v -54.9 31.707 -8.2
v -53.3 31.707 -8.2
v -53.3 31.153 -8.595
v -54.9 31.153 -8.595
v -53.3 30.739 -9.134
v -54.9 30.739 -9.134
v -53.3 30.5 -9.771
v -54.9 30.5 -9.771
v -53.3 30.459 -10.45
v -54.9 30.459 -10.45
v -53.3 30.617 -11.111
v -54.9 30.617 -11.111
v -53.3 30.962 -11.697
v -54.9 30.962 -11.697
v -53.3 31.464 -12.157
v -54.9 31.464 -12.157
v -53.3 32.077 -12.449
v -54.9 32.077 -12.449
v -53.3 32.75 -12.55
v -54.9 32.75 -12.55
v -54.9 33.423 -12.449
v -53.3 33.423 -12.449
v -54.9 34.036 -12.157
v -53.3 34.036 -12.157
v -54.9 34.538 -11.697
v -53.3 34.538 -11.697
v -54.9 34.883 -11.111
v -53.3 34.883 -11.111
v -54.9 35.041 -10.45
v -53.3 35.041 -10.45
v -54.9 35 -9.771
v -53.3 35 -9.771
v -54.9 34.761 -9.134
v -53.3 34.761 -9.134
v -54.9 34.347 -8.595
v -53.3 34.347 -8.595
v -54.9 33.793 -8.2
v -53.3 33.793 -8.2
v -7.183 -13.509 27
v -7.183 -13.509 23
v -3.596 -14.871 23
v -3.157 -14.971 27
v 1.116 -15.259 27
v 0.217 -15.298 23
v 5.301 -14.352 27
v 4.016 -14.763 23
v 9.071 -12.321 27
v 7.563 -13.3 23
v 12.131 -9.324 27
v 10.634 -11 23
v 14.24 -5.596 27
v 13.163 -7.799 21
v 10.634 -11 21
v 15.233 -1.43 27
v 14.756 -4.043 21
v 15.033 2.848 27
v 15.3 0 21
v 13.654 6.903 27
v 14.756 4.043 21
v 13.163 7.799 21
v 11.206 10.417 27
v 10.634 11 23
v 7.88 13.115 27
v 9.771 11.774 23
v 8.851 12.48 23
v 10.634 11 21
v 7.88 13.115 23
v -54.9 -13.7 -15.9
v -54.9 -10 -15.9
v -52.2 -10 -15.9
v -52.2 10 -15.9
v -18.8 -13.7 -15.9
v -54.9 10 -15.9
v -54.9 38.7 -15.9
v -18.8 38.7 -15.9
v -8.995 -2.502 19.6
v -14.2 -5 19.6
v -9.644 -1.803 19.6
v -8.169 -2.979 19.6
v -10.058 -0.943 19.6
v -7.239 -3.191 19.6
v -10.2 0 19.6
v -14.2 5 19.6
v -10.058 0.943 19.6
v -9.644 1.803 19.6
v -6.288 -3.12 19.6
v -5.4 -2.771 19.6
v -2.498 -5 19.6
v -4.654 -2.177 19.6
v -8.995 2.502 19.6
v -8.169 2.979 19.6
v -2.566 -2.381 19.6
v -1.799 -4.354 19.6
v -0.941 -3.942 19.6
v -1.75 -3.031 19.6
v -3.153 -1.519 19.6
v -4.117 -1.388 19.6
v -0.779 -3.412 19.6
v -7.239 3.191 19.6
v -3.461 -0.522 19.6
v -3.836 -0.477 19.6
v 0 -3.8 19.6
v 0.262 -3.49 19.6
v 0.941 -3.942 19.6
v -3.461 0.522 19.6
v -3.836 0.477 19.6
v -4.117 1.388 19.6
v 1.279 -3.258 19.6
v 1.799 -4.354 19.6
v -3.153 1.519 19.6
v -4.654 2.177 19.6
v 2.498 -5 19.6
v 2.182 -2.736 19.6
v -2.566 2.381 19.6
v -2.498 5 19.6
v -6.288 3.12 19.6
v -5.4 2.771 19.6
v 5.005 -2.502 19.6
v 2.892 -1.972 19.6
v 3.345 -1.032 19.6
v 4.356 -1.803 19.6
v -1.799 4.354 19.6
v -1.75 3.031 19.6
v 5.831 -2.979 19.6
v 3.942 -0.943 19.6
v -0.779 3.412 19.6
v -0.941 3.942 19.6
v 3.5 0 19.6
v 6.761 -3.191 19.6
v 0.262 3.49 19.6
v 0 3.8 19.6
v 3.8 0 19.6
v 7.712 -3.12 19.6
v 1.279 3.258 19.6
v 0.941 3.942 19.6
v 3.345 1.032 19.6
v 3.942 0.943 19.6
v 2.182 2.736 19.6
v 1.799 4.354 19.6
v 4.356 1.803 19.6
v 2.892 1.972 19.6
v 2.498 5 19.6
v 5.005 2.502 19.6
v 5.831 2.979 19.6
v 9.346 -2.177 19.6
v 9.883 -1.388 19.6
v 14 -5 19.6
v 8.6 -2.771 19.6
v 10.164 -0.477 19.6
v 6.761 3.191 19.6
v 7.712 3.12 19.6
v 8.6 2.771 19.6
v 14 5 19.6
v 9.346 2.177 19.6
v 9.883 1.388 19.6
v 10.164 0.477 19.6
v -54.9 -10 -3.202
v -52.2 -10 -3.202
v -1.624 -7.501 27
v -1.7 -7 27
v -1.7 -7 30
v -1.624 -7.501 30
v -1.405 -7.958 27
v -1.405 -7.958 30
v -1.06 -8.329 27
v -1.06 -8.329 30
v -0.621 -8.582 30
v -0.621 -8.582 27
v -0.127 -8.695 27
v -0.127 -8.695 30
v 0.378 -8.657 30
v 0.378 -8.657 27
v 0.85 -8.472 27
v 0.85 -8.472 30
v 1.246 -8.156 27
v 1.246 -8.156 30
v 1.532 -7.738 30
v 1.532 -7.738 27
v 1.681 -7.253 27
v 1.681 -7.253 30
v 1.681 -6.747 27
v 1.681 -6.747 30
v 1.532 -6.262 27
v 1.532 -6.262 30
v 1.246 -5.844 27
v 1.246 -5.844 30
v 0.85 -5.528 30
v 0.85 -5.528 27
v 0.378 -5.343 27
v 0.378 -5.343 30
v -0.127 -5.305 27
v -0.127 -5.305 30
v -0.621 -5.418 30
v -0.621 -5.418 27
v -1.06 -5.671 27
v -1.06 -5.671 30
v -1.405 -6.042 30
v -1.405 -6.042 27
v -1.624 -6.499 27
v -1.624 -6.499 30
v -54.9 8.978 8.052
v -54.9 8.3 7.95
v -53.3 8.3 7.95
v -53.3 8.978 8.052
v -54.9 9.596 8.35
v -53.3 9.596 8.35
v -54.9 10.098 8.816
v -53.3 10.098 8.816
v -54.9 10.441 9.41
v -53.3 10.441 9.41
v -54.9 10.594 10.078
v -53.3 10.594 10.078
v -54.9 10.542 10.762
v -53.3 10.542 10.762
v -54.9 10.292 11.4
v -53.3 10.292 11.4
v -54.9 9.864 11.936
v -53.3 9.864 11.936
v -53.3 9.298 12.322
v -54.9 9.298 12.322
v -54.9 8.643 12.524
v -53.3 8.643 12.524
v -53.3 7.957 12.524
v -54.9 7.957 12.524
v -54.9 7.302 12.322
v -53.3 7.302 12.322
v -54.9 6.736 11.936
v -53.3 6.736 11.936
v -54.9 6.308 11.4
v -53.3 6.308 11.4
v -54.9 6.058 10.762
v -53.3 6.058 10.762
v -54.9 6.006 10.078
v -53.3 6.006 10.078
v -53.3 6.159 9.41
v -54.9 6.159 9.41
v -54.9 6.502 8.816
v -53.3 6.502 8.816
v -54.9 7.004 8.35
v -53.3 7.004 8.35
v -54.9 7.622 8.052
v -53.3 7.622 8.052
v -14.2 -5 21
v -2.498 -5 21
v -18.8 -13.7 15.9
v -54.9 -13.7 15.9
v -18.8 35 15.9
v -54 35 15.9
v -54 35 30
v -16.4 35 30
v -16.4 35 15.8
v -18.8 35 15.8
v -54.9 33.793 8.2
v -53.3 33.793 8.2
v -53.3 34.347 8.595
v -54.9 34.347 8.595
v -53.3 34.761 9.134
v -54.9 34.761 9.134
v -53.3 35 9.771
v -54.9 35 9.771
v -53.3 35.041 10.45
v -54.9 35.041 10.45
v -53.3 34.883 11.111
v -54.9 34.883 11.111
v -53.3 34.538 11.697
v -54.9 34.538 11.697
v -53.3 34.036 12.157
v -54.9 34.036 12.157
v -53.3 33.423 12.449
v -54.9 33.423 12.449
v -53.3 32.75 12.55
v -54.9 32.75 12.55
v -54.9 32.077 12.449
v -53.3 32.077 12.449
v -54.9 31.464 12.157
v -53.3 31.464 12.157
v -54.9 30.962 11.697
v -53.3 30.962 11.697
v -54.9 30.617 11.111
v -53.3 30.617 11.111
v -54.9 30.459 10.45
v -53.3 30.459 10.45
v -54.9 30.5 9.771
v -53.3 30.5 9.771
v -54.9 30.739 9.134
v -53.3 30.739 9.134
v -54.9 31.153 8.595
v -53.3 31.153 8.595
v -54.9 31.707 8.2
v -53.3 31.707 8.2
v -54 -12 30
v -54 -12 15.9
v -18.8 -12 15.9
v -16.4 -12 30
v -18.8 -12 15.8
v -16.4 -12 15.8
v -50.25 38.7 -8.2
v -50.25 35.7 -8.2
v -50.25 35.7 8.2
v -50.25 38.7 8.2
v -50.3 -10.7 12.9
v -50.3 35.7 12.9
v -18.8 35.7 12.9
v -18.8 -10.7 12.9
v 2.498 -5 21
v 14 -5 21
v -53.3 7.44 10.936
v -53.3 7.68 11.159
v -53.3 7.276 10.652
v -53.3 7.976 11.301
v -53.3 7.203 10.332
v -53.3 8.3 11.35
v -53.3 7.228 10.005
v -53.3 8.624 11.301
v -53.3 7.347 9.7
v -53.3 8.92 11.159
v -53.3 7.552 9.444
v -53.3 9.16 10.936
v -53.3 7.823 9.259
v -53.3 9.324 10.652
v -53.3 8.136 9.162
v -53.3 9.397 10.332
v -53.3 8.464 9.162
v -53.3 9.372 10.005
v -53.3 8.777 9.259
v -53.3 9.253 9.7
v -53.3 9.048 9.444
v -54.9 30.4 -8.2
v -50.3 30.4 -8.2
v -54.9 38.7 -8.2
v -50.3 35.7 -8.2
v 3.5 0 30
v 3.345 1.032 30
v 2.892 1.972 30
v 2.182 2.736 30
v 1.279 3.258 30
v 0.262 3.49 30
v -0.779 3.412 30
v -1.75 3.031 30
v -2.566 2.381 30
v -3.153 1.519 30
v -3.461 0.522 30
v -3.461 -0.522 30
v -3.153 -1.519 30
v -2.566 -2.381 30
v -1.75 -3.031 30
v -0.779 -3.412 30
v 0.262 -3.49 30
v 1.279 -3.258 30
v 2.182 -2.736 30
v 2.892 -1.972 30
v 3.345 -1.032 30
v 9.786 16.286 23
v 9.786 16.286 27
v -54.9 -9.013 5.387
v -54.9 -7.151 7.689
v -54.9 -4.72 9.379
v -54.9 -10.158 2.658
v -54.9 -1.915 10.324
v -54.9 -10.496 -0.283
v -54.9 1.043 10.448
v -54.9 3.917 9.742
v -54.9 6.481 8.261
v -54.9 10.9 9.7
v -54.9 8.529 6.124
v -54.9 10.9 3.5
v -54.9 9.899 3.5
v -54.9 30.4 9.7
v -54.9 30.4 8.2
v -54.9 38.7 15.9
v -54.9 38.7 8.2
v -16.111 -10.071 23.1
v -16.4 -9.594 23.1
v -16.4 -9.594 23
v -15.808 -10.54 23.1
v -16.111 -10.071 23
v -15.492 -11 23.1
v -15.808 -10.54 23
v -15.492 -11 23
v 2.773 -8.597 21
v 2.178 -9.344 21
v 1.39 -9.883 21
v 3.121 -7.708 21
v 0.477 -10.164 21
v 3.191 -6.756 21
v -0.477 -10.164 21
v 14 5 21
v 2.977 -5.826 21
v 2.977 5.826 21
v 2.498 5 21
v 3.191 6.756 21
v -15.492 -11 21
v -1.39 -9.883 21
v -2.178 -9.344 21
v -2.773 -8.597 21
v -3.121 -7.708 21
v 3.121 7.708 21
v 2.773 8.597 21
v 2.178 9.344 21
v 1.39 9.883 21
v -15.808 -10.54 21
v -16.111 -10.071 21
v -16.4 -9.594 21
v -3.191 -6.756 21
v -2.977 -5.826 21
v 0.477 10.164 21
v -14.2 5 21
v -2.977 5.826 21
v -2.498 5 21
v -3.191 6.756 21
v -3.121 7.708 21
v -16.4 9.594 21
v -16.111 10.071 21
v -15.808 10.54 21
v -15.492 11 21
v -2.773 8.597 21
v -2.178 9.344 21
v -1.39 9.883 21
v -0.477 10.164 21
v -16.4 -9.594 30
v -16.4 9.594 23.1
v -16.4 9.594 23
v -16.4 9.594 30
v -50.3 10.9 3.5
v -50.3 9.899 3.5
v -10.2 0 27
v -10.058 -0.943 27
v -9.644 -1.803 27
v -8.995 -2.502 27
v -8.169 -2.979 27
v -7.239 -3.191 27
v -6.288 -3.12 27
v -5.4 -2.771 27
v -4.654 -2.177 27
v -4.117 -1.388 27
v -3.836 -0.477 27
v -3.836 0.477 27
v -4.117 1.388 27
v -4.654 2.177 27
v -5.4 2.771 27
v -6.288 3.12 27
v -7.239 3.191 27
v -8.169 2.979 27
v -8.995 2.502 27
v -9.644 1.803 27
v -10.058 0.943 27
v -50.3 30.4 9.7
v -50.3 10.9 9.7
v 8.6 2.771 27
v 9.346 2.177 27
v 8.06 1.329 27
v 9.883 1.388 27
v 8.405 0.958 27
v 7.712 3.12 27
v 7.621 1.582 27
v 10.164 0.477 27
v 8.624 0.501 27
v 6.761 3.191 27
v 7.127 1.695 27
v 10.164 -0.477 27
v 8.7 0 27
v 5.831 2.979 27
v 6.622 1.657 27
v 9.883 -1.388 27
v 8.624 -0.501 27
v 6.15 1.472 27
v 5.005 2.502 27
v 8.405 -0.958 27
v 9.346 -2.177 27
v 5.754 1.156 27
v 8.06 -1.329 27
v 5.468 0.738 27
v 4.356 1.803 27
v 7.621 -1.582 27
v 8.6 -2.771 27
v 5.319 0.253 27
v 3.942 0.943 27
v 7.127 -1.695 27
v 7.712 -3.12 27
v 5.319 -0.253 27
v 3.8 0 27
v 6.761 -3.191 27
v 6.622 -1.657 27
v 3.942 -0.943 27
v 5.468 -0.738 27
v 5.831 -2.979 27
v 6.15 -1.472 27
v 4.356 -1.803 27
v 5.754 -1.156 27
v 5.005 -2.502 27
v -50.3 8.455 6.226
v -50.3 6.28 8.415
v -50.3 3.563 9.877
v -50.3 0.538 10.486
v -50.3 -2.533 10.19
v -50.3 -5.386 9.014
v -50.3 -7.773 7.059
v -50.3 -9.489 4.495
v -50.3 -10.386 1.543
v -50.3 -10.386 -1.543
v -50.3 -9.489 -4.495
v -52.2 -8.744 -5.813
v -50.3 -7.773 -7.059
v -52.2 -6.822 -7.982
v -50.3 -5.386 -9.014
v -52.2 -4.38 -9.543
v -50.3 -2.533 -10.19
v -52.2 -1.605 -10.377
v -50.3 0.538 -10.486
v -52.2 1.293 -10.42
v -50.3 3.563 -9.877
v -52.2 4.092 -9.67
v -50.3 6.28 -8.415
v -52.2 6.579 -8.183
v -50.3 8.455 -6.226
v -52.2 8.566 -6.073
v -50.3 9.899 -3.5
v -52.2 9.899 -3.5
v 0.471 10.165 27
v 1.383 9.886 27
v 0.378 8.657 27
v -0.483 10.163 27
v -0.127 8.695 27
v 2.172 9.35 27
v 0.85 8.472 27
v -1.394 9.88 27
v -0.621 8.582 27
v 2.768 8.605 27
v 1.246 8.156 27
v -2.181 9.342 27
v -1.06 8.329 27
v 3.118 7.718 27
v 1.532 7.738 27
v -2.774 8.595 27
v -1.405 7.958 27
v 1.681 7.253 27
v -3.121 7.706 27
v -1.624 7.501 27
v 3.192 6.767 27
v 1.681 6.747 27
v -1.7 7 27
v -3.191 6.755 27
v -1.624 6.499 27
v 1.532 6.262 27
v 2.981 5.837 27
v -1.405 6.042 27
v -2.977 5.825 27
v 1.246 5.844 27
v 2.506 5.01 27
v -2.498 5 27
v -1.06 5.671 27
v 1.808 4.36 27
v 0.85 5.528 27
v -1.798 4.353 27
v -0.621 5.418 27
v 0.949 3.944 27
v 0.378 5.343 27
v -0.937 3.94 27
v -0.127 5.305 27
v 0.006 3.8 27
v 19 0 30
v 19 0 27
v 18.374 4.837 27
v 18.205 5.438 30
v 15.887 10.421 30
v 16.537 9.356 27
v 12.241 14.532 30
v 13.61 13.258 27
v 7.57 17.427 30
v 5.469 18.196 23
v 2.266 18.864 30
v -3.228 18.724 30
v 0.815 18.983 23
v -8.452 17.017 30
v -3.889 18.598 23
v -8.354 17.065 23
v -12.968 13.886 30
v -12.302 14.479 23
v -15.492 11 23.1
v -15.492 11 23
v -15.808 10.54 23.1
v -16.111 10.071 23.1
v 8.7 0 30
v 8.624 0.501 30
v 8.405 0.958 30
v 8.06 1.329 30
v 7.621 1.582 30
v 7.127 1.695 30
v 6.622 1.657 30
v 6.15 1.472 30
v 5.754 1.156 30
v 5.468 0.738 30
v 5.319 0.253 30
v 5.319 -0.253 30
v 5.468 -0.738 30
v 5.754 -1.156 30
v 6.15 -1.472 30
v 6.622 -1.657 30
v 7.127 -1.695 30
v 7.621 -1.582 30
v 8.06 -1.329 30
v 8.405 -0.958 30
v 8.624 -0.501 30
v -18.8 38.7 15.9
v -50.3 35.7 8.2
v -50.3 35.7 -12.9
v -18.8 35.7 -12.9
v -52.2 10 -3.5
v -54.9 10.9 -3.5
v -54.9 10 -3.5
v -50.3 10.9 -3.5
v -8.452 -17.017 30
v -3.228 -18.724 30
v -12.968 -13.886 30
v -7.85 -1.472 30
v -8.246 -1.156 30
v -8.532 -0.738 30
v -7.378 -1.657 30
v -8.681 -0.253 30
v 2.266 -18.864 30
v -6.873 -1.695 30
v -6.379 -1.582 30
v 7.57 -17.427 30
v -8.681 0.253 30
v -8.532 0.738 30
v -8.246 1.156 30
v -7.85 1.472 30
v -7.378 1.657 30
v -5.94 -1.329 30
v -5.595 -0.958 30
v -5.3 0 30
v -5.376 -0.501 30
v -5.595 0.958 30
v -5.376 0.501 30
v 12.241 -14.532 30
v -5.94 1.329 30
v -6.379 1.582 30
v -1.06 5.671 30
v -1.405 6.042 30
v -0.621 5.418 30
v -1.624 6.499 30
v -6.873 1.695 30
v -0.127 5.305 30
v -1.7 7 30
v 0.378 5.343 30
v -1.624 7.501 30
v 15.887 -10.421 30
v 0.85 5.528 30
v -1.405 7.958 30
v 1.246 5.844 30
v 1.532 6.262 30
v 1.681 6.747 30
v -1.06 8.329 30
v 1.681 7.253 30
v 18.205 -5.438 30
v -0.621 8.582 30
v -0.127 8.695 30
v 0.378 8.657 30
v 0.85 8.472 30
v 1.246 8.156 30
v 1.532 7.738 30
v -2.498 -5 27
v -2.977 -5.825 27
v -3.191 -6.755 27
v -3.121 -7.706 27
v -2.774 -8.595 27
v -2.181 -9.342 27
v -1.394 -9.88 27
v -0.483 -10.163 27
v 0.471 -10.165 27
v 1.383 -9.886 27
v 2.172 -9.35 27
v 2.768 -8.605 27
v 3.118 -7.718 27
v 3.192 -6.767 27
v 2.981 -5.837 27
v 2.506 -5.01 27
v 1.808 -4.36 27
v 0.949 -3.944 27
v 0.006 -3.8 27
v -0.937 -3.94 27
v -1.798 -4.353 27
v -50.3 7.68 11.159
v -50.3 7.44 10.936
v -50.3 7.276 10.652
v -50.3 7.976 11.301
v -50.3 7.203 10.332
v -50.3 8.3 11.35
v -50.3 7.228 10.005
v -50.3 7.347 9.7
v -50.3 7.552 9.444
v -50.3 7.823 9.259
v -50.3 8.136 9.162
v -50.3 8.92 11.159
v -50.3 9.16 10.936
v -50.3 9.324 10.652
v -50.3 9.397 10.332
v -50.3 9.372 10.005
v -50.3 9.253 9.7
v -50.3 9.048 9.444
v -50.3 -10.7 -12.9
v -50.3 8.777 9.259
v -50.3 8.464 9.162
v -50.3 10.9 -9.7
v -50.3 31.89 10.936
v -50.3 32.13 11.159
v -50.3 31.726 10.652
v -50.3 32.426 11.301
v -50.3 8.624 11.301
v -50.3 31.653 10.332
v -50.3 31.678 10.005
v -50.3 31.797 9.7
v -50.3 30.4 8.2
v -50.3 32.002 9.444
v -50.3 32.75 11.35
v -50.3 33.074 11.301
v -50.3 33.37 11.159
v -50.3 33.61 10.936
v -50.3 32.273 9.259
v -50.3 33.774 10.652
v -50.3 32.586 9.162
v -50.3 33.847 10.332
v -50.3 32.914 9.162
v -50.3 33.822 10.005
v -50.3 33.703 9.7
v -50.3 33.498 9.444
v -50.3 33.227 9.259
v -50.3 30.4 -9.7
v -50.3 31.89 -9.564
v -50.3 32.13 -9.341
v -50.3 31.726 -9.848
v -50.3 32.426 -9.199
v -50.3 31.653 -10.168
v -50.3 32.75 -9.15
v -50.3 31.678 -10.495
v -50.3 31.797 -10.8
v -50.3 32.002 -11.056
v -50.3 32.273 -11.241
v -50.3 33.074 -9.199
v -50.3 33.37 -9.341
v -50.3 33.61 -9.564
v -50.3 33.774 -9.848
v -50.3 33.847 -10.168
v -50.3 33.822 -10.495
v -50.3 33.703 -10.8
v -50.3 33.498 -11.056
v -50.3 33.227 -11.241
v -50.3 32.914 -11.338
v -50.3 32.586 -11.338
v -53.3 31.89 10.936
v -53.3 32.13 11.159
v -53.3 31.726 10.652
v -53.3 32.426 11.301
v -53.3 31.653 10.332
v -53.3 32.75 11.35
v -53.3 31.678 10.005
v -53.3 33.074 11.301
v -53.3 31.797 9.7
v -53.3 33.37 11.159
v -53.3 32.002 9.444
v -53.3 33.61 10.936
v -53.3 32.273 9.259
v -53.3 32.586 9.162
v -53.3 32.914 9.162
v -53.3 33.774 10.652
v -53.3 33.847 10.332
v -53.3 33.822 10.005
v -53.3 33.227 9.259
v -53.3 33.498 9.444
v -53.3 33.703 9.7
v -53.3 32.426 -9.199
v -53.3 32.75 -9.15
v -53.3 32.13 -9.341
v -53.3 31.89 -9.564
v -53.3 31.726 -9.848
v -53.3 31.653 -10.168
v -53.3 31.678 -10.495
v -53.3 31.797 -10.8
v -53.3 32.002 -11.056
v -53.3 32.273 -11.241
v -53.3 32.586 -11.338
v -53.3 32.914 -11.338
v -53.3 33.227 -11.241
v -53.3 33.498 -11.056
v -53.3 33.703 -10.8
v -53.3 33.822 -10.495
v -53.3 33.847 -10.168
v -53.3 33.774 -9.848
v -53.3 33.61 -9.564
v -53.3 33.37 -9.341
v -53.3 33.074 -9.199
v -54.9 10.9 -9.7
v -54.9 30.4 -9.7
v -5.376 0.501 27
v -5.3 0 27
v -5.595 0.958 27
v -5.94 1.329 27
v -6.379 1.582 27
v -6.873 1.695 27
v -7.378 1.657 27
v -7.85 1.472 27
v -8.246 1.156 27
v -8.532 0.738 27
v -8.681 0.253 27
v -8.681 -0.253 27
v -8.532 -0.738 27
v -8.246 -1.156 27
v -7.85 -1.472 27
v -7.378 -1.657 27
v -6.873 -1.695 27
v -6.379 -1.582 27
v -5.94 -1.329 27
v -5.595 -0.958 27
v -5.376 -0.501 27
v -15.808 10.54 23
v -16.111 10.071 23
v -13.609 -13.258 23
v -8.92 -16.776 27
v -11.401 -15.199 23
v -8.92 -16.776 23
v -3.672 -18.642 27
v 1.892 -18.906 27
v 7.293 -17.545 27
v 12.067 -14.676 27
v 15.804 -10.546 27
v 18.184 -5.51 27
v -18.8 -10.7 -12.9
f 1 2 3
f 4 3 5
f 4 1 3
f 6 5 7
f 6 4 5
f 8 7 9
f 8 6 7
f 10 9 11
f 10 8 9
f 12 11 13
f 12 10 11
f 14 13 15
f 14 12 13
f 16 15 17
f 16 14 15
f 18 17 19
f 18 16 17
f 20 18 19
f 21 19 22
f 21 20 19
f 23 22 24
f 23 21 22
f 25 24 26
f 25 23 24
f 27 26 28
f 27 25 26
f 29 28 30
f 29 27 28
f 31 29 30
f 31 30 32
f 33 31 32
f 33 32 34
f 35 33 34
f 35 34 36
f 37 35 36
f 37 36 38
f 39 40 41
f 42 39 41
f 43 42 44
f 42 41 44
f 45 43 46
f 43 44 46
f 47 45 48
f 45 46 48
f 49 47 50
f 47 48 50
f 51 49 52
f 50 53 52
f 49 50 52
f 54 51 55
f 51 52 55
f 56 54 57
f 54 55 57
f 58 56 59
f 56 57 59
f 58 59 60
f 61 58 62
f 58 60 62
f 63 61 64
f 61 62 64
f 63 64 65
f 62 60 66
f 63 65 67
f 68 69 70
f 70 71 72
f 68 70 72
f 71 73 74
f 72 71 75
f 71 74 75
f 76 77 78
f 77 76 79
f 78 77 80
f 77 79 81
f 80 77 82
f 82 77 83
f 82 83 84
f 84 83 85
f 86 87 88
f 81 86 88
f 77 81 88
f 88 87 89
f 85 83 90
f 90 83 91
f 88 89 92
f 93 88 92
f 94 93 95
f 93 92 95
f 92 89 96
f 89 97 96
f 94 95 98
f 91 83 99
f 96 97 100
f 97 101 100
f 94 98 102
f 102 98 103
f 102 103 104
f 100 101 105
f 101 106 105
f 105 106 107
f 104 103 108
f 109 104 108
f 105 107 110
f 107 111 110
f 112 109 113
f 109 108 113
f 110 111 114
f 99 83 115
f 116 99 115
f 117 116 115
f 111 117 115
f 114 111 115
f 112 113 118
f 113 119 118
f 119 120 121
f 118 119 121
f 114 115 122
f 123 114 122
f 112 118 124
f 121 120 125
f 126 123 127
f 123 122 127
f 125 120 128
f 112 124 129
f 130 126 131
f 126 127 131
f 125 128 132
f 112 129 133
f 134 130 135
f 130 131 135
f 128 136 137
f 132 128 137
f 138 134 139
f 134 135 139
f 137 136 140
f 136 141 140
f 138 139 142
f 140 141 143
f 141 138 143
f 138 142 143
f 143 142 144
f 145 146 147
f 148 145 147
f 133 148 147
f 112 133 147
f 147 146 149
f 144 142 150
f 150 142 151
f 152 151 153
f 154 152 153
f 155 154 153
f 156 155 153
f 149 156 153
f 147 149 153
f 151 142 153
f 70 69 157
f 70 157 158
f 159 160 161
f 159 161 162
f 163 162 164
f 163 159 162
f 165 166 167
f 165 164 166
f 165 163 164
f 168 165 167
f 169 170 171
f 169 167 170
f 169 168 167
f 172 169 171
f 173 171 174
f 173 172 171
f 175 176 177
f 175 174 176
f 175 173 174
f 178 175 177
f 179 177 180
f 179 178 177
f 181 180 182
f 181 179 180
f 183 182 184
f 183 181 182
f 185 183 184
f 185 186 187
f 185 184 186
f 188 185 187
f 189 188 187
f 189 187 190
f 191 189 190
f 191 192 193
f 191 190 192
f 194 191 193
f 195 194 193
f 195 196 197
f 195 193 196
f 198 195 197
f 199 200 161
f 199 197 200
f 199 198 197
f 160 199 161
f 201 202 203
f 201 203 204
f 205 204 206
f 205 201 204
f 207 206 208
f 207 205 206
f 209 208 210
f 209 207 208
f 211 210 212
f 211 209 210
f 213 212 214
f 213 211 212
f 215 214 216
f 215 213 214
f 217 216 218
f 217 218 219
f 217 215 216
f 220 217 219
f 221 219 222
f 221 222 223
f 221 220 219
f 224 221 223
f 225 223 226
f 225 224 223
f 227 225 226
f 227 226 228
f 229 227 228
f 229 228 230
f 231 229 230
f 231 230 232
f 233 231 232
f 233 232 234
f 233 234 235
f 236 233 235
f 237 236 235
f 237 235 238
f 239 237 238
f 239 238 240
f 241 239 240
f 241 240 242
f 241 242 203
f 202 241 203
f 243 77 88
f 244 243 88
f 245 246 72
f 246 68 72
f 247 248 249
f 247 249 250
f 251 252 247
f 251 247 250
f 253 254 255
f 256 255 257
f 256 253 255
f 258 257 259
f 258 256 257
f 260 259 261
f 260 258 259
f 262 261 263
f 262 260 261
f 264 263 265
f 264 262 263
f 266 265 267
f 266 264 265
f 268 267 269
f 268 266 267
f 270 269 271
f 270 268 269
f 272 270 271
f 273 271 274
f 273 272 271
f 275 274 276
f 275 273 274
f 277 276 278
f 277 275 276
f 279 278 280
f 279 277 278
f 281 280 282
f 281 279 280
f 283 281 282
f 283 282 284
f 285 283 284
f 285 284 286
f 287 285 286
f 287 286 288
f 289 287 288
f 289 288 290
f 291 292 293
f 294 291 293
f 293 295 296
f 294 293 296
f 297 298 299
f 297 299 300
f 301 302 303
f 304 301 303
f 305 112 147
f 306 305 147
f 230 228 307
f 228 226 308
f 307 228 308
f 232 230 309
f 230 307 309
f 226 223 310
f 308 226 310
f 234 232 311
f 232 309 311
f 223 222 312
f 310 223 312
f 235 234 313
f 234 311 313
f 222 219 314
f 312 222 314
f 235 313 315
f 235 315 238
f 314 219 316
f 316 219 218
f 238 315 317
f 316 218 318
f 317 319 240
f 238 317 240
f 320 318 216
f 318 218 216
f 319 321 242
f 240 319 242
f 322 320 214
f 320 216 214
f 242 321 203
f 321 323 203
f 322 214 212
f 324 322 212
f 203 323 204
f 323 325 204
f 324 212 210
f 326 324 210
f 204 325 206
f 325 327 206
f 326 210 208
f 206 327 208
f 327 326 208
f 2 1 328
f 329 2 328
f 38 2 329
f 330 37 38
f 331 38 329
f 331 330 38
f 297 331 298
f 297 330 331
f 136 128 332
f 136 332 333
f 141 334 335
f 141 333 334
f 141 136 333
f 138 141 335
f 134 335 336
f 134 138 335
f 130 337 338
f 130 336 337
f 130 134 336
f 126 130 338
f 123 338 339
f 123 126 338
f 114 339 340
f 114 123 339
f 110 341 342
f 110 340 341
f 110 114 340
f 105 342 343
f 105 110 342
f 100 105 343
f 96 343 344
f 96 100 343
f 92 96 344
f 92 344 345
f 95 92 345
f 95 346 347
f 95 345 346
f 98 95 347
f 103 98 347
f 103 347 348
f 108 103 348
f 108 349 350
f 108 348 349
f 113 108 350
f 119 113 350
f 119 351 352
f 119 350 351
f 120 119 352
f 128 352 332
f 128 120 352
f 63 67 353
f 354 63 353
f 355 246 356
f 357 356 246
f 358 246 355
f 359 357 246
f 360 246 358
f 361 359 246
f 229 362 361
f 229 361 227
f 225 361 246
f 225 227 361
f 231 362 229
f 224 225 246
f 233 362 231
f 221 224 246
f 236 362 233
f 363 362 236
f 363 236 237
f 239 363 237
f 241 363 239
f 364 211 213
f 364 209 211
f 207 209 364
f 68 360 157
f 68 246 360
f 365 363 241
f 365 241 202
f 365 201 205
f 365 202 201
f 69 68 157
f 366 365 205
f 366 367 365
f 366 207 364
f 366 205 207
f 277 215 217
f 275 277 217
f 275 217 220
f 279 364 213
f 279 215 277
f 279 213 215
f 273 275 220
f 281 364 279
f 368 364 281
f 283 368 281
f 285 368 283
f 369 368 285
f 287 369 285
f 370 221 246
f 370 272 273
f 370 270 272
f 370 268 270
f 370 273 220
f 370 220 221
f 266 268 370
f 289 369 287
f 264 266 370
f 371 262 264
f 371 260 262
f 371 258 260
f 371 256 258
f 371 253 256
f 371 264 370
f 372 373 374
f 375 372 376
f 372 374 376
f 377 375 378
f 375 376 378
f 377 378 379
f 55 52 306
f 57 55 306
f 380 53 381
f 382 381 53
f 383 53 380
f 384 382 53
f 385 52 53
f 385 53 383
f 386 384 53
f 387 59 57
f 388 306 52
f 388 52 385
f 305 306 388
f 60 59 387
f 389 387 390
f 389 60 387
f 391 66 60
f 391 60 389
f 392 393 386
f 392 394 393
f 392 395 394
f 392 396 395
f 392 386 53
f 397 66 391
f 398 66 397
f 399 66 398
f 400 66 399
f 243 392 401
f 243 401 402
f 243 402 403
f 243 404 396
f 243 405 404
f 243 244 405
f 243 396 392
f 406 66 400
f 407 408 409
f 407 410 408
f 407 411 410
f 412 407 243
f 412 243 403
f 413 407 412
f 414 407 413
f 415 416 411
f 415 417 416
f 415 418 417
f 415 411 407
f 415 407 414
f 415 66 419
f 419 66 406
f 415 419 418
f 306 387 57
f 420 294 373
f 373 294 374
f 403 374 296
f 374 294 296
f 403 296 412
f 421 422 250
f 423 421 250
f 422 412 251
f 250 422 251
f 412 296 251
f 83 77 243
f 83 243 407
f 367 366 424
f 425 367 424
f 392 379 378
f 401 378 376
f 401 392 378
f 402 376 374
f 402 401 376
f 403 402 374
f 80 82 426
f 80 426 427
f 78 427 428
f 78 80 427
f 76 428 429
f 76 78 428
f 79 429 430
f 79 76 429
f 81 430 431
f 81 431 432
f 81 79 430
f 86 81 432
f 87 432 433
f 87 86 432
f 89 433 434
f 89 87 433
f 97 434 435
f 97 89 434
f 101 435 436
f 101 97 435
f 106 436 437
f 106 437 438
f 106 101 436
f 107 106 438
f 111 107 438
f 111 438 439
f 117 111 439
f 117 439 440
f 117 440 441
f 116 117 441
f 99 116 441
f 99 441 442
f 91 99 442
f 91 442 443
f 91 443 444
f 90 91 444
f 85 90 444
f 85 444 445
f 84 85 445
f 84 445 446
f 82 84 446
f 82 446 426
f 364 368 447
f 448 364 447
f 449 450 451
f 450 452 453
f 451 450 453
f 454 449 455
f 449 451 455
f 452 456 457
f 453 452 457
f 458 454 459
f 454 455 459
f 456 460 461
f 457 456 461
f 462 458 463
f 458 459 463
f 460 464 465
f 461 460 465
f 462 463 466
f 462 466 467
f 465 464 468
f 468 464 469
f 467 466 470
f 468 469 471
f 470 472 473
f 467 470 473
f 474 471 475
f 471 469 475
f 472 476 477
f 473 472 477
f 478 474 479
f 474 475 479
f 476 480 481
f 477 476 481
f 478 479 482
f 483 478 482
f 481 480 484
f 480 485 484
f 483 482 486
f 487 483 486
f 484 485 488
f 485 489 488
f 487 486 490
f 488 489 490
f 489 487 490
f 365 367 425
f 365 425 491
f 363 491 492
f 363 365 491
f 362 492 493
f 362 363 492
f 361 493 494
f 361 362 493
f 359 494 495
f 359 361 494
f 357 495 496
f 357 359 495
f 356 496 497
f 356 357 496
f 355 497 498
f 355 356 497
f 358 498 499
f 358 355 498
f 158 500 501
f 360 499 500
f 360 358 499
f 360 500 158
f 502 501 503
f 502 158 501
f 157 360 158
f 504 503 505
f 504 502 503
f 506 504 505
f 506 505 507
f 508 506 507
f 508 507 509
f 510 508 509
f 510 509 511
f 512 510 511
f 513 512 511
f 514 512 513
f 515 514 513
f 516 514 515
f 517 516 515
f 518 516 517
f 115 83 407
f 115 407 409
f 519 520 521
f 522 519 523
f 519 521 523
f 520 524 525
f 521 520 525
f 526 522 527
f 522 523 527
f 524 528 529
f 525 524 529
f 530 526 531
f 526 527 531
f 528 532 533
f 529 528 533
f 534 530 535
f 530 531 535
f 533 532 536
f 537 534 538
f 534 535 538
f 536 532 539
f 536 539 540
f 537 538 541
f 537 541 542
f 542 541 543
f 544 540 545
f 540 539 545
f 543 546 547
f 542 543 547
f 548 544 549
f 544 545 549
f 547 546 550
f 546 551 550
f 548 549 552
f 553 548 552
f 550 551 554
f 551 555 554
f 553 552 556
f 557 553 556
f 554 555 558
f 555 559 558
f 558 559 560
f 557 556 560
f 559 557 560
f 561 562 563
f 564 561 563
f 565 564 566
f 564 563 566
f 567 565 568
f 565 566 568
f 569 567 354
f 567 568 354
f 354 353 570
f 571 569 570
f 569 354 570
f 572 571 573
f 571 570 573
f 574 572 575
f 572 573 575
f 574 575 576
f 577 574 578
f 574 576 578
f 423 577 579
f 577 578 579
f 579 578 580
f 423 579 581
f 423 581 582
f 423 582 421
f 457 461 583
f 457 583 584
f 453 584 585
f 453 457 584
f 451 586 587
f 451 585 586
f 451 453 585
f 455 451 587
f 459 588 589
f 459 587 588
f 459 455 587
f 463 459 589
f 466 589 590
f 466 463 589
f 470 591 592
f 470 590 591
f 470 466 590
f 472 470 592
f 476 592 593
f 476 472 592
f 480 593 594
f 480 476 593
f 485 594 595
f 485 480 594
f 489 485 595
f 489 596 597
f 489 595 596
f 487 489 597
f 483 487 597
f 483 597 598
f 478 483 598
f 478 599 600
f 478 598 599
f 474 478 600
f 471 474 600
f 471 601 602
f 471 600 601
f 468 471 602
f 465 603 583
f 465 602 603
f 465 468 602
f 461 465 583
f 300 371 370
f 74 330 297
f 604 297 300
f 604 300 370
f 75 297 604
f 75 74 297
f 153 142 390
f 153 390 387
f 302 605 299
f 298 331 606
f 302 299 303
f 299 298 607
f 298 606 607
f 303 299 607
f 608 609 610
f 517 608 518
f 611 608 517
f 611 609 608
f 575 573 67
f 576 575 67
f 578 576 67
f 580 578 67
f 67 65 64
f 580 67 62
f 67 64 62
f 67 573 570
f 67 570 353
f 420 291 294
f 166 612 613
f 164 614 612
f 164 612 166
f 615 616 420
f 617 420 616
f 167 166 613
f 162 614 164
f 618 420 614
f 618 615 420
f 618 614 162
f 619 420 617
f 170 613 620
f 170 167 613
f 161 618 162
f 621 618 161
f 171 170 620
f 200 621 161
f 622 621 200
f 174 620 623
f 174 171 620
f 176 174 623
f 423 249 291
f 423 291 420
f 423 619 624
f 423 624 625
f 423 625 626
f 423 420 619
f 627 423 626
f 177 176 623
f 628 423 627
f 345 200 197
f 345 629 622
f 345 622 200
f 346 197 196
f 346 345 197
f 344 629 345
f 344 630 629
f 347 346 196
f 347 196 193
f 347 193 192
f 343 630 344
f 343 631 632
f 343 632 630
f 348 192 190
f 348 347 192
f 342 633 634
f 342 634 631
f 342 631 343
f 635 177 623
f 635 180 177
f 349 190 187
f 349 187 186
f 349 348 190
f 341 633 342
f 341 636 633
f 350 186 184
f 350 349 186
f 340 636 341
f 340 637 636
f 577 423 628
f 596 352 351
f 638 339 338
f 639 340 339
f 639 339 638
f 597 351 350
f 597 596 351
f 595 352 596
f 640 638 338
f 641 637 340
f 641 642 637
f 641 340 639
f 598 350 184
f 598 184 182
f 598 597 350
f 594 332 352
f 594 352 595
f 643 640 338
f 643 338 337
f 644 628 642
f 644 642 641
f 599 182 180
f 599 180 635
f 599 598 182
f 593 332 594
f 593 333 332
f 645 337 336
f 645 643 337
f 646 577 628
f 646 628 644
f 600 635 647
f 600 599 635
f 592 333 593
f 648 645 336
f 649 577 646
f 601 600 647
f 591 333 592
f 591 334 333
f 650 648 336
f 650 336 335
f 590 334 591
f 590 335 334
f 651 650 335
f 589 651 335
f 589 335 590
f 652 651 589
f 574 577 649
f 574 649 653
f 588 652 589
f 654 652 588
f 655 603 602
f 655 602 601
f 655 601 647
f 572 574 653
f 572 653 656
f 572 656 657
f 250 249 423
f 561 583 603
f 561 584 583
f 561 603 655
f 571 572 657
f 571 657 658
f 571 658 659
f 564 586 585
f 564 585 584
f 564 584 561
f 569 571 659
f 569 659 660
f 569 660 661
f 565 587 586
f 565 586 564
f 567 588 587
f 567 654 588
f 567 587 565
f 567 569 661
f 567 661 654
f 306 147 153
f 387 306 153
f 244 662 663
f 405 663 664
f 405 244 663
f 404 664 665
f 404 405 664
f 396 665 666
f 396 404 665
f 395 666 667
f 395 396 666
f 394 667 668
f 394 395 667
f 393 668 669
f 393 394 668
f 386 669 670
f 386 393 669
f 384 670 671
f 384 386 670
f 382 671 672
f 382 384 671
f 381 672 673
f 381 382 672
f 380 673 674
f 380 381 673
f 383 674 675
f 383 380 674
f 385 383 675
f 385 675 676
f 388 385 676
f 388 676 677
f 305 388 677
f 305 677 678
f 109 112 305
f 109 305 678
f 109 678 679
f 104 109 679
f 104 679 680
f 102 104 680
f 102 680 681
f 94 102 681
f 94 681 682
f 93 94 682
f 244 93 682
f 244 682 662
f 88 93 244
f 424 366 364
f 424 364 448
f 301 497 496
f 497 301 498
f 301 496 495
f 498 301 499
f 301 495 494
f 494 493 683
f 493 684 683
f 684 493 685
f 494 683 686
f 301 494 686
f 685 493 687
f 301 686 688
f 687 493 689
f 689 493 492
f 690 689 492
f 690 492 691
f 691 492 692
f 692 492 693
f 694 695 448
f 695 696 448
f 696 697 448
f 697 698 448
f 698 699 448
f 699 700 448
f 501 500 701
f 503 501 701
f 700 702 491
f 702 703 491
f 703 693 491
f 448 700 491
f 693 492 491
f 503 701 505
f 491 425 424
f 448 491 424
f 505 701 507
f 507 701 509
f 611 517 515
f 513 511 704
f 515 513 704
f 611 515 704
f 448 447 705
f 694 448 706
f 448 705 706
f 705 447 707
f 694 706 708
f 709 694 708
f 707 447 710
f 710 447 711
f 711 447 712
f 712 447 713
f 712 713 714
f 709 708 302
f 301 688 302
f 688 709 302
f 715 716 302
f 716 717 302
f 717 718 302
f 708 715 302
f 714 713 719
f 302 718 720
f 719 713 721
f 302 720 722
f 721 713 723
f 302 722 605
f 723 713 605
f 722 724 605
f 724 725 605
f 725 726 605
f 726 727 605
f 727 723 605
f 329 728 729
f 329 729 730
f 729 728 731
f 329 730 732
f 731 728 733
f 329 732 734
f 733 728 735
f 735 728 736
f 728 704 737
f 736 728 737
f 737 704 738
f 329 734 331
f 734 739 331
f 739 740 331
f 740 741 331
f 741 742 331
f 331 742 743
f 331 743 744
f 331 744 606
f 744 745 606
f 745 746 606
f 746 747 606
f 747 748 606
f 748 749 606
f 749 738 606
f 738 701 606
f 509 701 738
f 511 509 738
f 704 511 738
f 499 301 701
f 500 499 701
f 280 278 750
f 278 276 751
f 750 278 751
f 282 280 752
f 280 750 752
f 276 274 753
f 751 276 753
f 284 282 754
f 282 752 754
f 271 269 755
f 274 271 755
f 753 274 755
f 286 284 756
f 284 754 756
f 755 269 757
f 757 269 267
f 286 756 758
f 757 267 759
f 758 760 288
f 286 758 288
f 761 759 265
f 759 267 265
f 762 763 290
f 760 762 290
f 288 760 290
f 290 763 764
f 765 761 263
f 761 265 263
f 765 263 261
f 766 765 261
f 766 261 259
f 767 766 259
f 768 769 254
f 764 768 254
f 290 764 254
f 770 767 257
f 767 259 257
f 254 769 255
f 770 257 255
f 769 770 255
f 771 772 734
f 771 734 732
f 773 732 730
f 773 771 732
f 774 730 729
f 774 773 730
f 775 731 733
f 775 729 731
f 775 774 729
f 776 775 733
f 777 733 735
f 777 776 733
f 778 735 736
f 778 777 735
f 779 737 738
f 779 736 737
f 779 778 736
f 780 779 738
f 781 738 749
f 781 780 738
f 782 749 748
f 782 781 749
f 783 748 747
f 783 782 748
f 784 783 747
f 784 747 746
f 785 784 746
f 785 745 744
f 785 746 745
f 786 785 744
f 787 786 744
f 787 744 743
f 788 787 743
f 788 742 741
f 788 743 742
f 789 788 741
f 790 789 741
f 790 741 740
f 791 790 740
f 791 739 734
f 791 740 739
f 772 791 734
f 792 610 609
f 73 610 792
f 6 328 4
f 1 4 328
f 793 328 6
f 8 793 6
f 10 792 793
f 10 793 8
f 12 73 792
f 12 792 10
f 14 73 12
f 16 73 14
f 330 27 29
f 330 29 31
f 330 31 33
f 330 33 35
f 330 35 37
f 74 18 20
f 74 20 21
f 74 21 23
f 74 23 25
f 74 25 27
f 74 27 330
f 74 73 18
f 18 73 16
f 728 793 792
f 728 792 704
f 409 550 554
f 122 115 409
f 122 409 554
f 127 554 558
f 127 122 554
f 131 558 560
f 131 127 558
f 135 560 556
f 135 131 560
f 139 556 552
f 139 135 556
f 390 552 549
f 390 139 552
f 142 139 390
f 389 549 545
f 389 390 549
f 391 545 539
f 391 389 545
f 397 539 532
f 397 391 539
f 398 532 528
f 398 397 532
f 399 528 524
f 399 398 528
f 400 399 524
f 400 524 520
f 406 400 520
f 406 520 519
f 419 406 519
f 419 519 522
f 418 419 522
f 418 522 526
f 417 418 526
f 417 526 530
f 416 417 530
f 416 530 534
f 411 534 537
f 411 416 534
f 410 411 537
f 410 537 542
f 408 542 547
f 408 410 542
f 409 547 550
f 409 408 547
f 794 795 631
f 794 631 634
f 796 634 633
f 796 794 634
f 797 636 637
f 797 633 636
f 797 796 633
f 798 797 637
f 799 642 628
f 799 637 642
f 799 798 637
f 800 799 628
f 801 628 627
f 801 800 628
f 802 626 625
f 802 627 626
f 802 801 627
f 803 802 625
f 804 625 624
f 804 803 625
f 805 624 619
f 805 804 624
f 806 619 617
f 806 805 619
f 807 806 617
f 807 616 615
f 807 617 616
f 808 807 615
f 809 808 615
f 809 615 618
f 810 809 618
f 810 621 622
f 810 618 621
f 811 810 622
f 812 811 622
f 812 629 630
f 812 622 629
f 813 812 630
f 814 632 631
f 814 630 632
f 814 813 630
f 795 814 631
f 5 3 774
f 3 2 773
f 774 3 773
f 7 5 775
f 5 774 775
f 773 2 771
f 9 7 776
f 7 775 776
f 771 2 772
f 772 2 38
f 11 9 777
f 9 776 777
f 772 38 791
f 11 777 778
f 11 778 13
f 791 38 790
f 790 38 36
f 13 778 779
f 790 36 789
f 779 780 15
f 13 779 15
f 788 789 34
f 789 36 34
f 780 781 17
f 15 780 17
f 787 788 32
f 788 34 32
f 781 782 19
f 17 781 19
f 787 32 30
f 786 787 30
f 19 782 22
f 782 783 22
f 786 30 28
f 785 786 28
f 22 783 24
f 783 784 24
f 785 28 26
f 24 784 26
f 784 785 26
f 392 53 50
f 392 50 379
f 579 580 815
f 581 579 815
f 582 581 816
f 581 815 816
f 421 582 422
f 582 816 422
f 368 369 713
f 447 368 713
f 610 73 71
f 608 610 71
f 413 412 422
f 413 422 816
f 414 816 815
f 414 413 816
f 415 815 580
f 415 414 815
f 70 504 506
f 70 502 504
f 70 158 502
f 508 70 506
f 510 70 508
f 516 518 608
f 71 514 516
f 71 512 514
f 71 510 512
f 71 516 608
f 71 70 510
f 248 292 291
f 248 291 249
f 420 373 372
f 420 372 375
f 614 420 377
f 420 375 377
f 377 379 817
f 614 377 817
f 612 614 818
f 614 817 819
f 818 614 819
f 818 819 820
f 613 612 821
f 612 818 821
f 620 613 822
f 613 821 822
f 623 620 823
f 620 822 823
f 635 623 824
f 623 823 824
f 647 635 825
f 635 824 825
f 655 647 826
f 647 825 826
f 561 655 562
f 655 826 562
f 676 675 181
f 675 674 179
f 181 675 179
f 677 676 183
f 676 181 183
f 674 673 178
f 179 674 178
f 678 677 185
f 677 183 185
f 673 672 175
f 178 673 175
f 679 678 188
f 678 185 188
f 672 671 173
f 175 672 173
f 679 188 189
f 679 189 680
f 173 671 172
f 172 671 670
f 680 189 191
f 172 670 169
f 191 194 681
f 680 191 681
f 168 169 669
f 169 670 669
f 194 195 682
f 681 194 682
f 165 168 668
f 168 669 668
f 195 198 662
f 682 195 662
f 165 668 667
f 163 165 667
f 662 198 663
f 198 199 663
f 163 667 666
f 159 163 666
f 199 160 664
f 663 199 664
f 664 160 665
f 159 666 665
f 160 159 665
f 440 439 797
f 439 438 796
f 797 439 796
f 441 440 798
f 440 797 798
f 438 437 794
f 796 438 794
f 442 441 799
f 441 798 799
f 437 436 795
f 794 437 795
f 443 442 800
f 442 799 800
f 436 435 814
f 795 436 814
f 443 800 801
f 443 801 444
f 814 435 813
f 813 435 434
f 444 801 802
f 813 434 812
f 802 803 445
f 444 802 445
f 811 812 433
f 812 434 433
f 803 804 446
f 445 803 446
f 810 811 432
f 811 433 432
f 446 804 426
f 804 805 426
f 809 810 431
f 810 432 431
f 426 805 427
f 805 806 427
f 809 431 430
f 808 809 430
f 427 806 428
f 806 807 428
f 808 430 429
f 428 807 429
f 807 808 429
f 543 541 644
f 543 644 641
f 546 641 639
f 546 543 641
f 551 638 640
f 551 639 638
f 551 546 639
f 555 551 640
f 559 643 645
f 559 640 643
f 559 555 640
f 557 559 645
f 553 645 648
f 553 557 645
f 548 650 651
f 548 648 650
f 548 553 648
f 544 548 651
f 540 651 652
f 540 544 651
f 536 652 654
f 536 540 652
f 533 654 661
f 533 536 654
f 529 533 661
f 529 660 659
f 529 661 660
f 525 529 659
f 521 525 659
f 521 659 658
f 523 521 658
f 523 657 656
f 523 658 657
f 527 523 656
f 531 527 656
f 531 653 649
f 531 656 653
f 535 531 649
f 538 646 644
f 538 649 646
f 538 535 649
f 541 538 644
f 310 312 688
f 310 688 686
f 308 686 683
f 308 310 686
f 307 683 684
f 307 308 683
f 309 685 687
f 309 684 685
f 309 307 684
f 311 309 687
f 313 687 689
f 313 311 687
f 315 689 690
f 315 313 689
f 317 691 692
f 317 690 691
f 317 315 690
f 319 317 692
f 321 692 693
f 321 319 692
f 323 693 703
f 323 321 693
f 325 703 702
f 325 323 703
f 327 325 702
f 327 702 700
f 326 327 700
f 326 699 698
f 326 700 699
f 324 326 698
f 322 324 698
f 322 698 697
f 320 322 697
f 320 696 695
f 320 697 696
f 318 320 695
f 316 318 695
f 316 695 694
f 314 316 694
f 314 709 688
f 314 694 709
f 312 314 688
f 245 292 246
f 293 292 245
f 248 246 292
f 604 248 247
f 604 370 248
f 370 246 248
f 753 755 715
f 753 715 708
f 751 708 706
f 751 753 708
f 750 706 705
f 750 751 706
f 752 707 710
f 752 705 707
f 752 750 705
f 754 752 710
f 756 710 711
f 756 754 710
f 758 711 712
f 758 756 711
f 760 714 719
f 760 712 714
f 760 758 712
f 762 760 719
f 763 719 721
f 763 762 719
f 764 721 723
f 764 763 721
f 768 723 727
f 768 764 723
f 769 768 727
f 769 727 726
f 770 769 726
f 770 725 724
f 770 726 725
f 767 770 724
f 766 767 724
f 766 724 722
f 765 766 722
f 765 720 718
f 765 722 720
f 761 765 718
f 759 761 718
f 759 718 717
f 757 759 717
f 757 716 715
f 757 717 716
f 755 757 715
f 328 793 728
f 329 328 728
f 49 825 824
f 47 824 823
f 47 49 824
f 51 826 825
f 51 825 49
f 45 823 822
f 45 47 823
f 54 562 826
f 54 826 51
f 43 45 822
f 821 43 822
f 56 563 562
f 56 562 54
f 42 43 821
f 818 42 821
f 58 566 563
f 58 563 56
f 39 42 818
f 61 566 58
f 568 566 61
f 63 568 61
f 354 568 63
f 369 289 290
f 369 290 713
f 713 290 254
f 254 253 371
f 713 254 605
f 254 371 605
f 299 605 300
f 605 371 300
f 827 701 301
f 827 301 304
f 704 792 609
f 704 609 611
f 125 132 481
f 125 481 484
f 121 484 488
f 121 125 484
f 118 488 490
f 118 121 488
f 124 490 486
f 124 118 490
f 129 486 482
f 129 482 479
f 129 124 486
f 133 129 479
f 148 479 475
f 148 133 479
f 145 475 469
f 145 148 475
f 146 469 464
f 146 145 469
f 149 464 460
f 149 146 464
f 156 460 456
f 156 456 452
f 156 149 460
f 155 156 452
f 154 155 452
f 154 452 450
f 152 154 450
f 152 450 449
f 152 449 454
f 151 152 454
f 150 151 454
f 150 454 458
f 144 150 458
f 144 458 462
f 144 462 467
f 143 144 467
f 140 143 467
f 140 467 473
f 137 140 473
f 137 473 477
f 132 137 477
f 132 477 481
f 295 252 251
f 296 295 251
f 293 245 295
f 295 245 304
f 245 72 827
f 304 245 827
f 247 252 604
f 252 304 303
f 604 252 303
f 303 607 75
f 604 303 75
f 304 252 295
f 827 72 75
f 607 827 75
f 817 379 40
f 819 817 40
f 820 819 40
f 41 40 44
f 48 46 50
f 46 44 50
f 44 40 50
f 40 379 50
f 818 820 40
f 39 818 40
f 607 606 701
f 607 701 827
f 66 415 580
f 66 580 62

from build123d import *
from build123d.topology import SkipClean

# Parameters (mm, degrees)
S_CYL1_R        = 19
BOSS_1_DEPTH    = 7
BOSS_2_DEPTH    = 2.1
S_BOX3_W        = 28.2
S_BOX3_H        = 10
BOSS_3_DEPTH    = 1.5
S_BOX4_W        = 37.6
S_BOX4_H        = 47
BOSS_4_DEPTH    = 14.2
S_BOX5_W        = 36.1
S_BOX5_H        = 3
BOSS_5_DEPTH    = 31.8
S_BOX6_W        = 36.1
S_BOX6_H        = 3
BOSS_6_DEPTH    = 31.8
S_BOX7_W        = 36.1
S_BOX7_H        = 52.4
BOSS_7_DEPTH    = 3
S_BOX8_W        = 36.1
S_BOX8_H        = 52.4
BOSS_8_DEPTH    = 3
S_BOX9_W        = 4.6
S_BOX9_H        = 52.4
BOSS_9_DEPTH    = 31.8
S_HOLE10_R      = 10.5
HOLE_10_DEPTH   = 4.8
S_CUT11_W       = 4.75
S_CUT11_H       = 19.5
POCKET_11_DEPTH = 19.4
S_CUT12_W       = 4.75
S_CUT12_H       = 8.8
POCKET_12_DEPTH = 16.4
S_CUT13_W       = 4.75
S_CUT13_H       = 11
POCKET_13_DEPTH = 7
S_CUT14_W       = 2.9
S_CUT14_H       = 20
POCKET_14_DEPTH = 16.4
S_HOLE15_R      = 1.1
HOLE_15_DEPTH   = 4.8
S_HOLE16_R      = 2.3
HOLE_16_DEPTH   = 1.7
S_HOLE17_R      = 1.1
HOLE_17_DEPTH   = 4.8
S_HOLE18_R      = 2.3
HOLE_18_DEPTH   = 1.7
S_HOLE19_R      = 1.1
HOLE_19_DEPTH   = 4.8
S_HOLE20_R      = 2.3
HOLE_20_DEPTH   = 1.7
CUT_21_DEPTH    = 6.1
S_HOLE22_R      = 3.5
HOLE_22_DEPTH   = 10.6
S_HOLE23_R      = 1.7
HOLE_23_DEPTH   = 10.6
S_HOLE24_R      = 1.7
HOLE_24_DEPTH   = 10.6
S_HOLE25_R      = 1.7
HOLE_25_DEPTH   = 10.6
S_HOLE26_R      = 1.7
HOLE_26_DEPTH   = 10.6
S_HOLE27_R      = 3.2
HOLE_27_DEPTH   = 7.6
S_HOLE28_R      = 3.2
HOLE_28_DEPTH   = 7.6
S_HOLE29_R      = 3.2
HOLE_29_DEPTH   = 7.6
S_HOLE30_R      = 3.2
HOLE_30_DEPTH   = 7.6


with BuildPart() as part:
    # S_cyl1 → Boss_1 (new body)
    with BuildSketch(Plane.XY.offset(23)):
        Circle(S_CYL1_R)
    extrude(amount=BOSS_1_DEPTH)

    # S_prism2 → Boss_2 (add)
    with SkipClean():  # the faces are left unmerged after this step: merging them gives an invalid solid
        with BuildSketch(Plane.XY.offset(21)):
            with BuildLine():
                Line((-15.491933385, 11), (15.491933385, 11))
                ThreePointArc((15.491933385, 11), (19, 0), (15.491933385, -11))
                Line((15.491933385, -11), (-15.491933385, -11))
                ThreePointArc((-15.491933385, -11), (-19, 0), (-15.491933385, 11))
            make_face()
        extrude(amount=BOSS_2_DEPTH)

    # S_box3 → Boss_3 (add)
    with SkipClean():  # the faces are left unmerged after this step: merging them gives an invalid solid
        with BuildSketch(Plane.XY.offset(19.6)):
            with Locations((-0.1, 0)):
                Rectangle(S_BOX3_W, S_BOX3_H)
        extrude(amount=BOSS_3_DEPTH)

    # S_box4 → Boss_4 (add)
    with SkipClean():  # the faces are left unmerged after this step: merging them gives an invalid solid
        with BuildSketch(Plane.XY.offset(15.8)):
            with Locations((-35.2, 11.5)):
                Rectangle(S_BOX4_W, S_BOX4_H)
        extrude(amount=BOSS_4_DEPTH)

    # S_box6 → Boss_6 (add)
    with SkipClean():  # the faces are left unmerged after this step: merging them gives an invalid solid
        with BuildSketch(Plane.XY.offset(-15.9)):
            with Locations((-36.85, -12.2)):
                Rectangle(S_BOX6_W, S_BOX6_H)
        extrude(amount=BOSS_6_DEPTH)



with BuildPart() as body_2:
    # S_box5 → Boss_5 (new body)
    with BuildSketch(Plane.XY.offset(-15.9)):
        with Locations((-36.85, 37.2)):
            Rectangle(S_BOX5_W, S_BOX5_H)
    extrude(amount=BOSS_5_DEPTH)


with BuildPart() as part_1:
    with SkipClean():  # the faces are left unmerged after this step: merging them gives an invalid solid
        add(part.part)

        add(body_2.part)  # Boss_7 merges body 2
        # S_box7 → Boss_7 (add)
        with BuildSketch(Plane.XY.offset(-15.9)):
            with Locations((-36.85, 12.5)):
                Rectangle(S_BOX7_W, S_BOX7_H)
        extrude(amount=BOSS_7_DEPTH)

    # S_box8 → Boss_8 (add)
    with SkipClean():  # the faces are left unmerged after this step: merging them gives an invalid solid
        with BuildSketch(Plane.XY.offset(12.9)):
            with Locations((-36.85, 12.5)):
                Rectangle(S_BOX8_W, S_BOX8_H)
        extrude(amount=BOSS_8_DEPTH)

    # S_box9 → Boss_9 (add)
    with SkipClean():  # the faces are left unmerged after this step: merging them gives an invalid solid
        with BuildSketch(Plane.XY.offset(-15.9)):
            with Locations((-52.6, 12.5)):
                Rectangle(S_BOX9_W, S_BOX9_H)
        extrude(amount=BOSS_9_DEPTH)

    # S_hole10 → Hole_10 (cut)
    with SkipClean():  # the faces are left unmerged after this step: merging them gives an invalid solid
        with BuildSketch(Plane(origin=(-55, 0, 0), x_dir=(0, 0, -1), z_dir=(1, 0, 0))):
            Circle(S_HOLE10_R)
        extrude(amount=HOLE_10_DEPTH, mode=Mode.SUBTRACT)

    # S_cut11 → Pocket_11 (cut)
    with SkipClean():  # the faces are left unmerged after this step: merging them gives an invalid solid
        with BuildSketch(Plane.XY.offset(-9.7)):
            with Locations((-52.625, 20.65)):
                Rectangle(S_CUT11_W, S_CUT11_H)
        extrude(amount=POCKET_11_DEPTH, mode=Mode.SUBTRACT)

    # S_cut12 → Pocket_12 (cut)
    with SkipClean():  # the faces are left unmerged after this step: merging them gives an invalid solid
        with BuildSketch(Plane.XY.offset(-8.2)):
            with Locations((-52.625, 34.8)):
                Rectangle(S_CUT12_W, S_CUT12_H)
        extrude(amount=POCKET_12_DEPTH, mode=Mode.SUBTRACT)

    # S_cut13 → Pocket_13 (cut)
    with SkipClean():  # the faces are left unmerged after this step: merging them gives an invalid solid
        with BuildSketch(Plane.XY.offset(-3.5)):
            with Locations((-52.625, 5.5)):
                Rectangle(S_CUT13_W, S_CUT13_H)
        extrude(amount=POCKET_13_DEPTH, mode=Mode.SUBTRACT)

    # S_cut14 → Pocket_14 (cut)
    with SkipClean():  # the faces are left unmerged after this step: merging them gives an invalid solid
        with BuildSketch(Plane.XY.offset(-16.4)):
            with Locations((-53.65, 0)):
                Rectangle(S_CUT14_W, S_CUT14_H)
        extrude(amount=POCKET_14_DEPTH, mode=Mode.SUBTRACT)

    # S_hole15 → Hole_15 (cut)
    with SkipClean():  # the faces are left unmerged after this step: merging them gives an invalid solid
        with BuildSketch(Plane(origin=(-55, 0, 0), x_dir=(0, 0, -1), z_dir=(1, 0, 0))):
            with Locations((-10.25, 8.3)):
                Circle(S_HOLE15_R)
        extrude(amount=HOLE_15_DEPTH, mode=Mode.SUBTRACT)

    # S_hole16 → Hole_16 (cut)
    with SkipClean():  # the faces are left unmerged after this step: merging them gives an invalid solid
        with BuildSketch(Plane(origin=(-55, 0, 0), x_dir=(0, 0, -1), z_dir=(1, 0, 0))):
            with Locations((-10.25, 8.3)):
                Circle(S_HOLE16_R)
        extrude(amount=HOLE_16_DEPTH, mode=Mode.SUBTRACT)

    # S_hole17 → Hole_17 (cut)
    with SkipClean():  # the faces are left unmerged after this step: merging them gives an invalid solid
        with BuildSketch(Plane(origin=(-55, 0, 0), x_dir=(0, 0, -1), z_dir=(1, 0, 0))):
            with Locations((10.25, 32.75)):
                Circle(S_HOLE17_R)
        extrude(amount=HOLE_17_DEPTH, mode=Mode.SUBTRACT)

    # S_hole18 → Hole_18 (cut)
    with SkipClean():  # the faces are left unmerged after this step: merging them gives an invalid solid
        with BuildSketch(Plane(origin=(-55, 0, 0), x_dir=(0, 0, -1), z_dir=(1, 0, 0))):
            with Locations((10.25, 32.75)):
                Circle(S_HOLE18_R)
        extrude(amount=HOLE_18_DEPTH, mode=Mode.SUBTRACT)

    # S_hole19 → Hole_19 (cut)
    with SkipClean():  # the faces are left unmerged after this step: merging them gives an invalid solid
        with BuildSketch(Plane(origin=(-55, 0, 0), x_dir=(0, 0, -1), z_dir=(1, 0, 0))):
            with Locations((-10.25, 32.75)):
                Circle(S_HOLE19_R)
        extrude(amount=HOLE_19_DEPTH, mode=Mode.SUBTRACT)

    # S_hole20 → Hole_20 (cut)
    with SkipClean():  # the faces are left unmerged after this step: merging them gives an invalid solid
        with BuildSketch(Plane(origin=(-55, 0, 0), x_dir=(0, 0, -1), z_dir=(1, 0, 0))):
            with Locations((-10.25, 32.75)):
                Circle(S_HOLE20_R)
        extrude(amount=HOLE_20_DEPTH, mode=Mode.SUBTRACT)

    # S_pcut21 → Cut_21 (cut)
    with BuildSketch(Plane.XY.offset(20.9)):
        with BuildLine():
            Line((-9.201642631, -17.30577282), (-7.182914911, -13.509098171))
            ThreePointArc((-7.182914911, -13.509098171), (13.316442148, -7.53408047), (7.880082546, 13.114659701))
            Line((7.880082546, 13.114659701), (10.094746268, 16.800479094))
            ThreePointArc((10.094746268, 16.800479094), (17.05897164, -9.651501778), (-9.201642631, -17.30577282))
        make_face()
    extrude(amount=CUT_21_DEPTH, mode=Mode.SUBTRACT)

    # S_hole22 → Hole_22 (cut)
    with BuildSketch(Plane.XY.offset(19.5)):
        Circle(S_HOLE22_R)
    extrude(amount=HOLE_22_DEPTH, mode=Mode.SUBTRACT)

    # S_hole23 → Hole_23 (cut)
    with BuildSketch(Plane.XY.offset(19.5)):
        with Locations((7, 0)):
            Circle(S_HOLE23_R)
    extrude(amount=HOLE_23_DEPTH, mode=Mode.SUBTRACT)

    # S_hole24 → Hole_24 (cut)
    with BuildSketch(Plane.XY.offset(19.5)):
        with Locations((0, -7)):
            Circle(S_HOLE24_R)
    extrude(amount=HOLE_24_DEPTH, mode=Mode.SUBTRACT)

    # S_hole25 → Hole_25 (cut)
    with BuildSketch(Plane.XY.offset(19.5)):
        with Locations((-7, 0)):
            Circle(S_HOLE25_R)
    extrude(amount=HOLE_25_DEPTH, mode=Mode.SUBTRACT)

    # S_hole26 → Hole_26 (cut)
    with BuildSketch(Plane.XY.offset(19.5)):
        with Locations((0, 7)):
            Circle(S_HOLE26_R)
    extrude(amount=HOLE_26_DEPTH, mode=Mode.SUBTRACT)

    # S_hole27 → Hole_27 (cut)
    with BuildSketch(Plane.XY.offset(19.4)):
        with Locations((7, 0)):
            Circle(S_HOLE27_R)
    extrude(amount=HOLE_27_DEPTH, mode=Mode.SUBTRACT)

    # S_hole28 → Hole_28 (cut)
    with BuildSketch(Plane.XY.offset(19.4)):
        with Locations((0, -7)):
            Circle(S_HOLE28_R)
    extrude(amount=HOLE_28_DEPTH, mode=Mode.SUBTRACT)

    # S_hole29 → Hole_29 (cut)
    with BuildSketch(Plane.XY.offset(19.4)):
        with Locations((-7, 0)):
            Circle(S_HOLE29_R)
    extrude(amount=HOLE_29_DEPTH, mode=Mode.SUBTRACT)

    # S_hole30 → Hole_30 (cut)
    with BuildSketch(Plane.XY.offset(19.4)):
        with Locations((0, 7)):
            Circle(S_HOLE30_R)
    extrude(amount=HOLE_30_DEPTH, mode=Mode.SUBTRACT)


solid = part_1.part
